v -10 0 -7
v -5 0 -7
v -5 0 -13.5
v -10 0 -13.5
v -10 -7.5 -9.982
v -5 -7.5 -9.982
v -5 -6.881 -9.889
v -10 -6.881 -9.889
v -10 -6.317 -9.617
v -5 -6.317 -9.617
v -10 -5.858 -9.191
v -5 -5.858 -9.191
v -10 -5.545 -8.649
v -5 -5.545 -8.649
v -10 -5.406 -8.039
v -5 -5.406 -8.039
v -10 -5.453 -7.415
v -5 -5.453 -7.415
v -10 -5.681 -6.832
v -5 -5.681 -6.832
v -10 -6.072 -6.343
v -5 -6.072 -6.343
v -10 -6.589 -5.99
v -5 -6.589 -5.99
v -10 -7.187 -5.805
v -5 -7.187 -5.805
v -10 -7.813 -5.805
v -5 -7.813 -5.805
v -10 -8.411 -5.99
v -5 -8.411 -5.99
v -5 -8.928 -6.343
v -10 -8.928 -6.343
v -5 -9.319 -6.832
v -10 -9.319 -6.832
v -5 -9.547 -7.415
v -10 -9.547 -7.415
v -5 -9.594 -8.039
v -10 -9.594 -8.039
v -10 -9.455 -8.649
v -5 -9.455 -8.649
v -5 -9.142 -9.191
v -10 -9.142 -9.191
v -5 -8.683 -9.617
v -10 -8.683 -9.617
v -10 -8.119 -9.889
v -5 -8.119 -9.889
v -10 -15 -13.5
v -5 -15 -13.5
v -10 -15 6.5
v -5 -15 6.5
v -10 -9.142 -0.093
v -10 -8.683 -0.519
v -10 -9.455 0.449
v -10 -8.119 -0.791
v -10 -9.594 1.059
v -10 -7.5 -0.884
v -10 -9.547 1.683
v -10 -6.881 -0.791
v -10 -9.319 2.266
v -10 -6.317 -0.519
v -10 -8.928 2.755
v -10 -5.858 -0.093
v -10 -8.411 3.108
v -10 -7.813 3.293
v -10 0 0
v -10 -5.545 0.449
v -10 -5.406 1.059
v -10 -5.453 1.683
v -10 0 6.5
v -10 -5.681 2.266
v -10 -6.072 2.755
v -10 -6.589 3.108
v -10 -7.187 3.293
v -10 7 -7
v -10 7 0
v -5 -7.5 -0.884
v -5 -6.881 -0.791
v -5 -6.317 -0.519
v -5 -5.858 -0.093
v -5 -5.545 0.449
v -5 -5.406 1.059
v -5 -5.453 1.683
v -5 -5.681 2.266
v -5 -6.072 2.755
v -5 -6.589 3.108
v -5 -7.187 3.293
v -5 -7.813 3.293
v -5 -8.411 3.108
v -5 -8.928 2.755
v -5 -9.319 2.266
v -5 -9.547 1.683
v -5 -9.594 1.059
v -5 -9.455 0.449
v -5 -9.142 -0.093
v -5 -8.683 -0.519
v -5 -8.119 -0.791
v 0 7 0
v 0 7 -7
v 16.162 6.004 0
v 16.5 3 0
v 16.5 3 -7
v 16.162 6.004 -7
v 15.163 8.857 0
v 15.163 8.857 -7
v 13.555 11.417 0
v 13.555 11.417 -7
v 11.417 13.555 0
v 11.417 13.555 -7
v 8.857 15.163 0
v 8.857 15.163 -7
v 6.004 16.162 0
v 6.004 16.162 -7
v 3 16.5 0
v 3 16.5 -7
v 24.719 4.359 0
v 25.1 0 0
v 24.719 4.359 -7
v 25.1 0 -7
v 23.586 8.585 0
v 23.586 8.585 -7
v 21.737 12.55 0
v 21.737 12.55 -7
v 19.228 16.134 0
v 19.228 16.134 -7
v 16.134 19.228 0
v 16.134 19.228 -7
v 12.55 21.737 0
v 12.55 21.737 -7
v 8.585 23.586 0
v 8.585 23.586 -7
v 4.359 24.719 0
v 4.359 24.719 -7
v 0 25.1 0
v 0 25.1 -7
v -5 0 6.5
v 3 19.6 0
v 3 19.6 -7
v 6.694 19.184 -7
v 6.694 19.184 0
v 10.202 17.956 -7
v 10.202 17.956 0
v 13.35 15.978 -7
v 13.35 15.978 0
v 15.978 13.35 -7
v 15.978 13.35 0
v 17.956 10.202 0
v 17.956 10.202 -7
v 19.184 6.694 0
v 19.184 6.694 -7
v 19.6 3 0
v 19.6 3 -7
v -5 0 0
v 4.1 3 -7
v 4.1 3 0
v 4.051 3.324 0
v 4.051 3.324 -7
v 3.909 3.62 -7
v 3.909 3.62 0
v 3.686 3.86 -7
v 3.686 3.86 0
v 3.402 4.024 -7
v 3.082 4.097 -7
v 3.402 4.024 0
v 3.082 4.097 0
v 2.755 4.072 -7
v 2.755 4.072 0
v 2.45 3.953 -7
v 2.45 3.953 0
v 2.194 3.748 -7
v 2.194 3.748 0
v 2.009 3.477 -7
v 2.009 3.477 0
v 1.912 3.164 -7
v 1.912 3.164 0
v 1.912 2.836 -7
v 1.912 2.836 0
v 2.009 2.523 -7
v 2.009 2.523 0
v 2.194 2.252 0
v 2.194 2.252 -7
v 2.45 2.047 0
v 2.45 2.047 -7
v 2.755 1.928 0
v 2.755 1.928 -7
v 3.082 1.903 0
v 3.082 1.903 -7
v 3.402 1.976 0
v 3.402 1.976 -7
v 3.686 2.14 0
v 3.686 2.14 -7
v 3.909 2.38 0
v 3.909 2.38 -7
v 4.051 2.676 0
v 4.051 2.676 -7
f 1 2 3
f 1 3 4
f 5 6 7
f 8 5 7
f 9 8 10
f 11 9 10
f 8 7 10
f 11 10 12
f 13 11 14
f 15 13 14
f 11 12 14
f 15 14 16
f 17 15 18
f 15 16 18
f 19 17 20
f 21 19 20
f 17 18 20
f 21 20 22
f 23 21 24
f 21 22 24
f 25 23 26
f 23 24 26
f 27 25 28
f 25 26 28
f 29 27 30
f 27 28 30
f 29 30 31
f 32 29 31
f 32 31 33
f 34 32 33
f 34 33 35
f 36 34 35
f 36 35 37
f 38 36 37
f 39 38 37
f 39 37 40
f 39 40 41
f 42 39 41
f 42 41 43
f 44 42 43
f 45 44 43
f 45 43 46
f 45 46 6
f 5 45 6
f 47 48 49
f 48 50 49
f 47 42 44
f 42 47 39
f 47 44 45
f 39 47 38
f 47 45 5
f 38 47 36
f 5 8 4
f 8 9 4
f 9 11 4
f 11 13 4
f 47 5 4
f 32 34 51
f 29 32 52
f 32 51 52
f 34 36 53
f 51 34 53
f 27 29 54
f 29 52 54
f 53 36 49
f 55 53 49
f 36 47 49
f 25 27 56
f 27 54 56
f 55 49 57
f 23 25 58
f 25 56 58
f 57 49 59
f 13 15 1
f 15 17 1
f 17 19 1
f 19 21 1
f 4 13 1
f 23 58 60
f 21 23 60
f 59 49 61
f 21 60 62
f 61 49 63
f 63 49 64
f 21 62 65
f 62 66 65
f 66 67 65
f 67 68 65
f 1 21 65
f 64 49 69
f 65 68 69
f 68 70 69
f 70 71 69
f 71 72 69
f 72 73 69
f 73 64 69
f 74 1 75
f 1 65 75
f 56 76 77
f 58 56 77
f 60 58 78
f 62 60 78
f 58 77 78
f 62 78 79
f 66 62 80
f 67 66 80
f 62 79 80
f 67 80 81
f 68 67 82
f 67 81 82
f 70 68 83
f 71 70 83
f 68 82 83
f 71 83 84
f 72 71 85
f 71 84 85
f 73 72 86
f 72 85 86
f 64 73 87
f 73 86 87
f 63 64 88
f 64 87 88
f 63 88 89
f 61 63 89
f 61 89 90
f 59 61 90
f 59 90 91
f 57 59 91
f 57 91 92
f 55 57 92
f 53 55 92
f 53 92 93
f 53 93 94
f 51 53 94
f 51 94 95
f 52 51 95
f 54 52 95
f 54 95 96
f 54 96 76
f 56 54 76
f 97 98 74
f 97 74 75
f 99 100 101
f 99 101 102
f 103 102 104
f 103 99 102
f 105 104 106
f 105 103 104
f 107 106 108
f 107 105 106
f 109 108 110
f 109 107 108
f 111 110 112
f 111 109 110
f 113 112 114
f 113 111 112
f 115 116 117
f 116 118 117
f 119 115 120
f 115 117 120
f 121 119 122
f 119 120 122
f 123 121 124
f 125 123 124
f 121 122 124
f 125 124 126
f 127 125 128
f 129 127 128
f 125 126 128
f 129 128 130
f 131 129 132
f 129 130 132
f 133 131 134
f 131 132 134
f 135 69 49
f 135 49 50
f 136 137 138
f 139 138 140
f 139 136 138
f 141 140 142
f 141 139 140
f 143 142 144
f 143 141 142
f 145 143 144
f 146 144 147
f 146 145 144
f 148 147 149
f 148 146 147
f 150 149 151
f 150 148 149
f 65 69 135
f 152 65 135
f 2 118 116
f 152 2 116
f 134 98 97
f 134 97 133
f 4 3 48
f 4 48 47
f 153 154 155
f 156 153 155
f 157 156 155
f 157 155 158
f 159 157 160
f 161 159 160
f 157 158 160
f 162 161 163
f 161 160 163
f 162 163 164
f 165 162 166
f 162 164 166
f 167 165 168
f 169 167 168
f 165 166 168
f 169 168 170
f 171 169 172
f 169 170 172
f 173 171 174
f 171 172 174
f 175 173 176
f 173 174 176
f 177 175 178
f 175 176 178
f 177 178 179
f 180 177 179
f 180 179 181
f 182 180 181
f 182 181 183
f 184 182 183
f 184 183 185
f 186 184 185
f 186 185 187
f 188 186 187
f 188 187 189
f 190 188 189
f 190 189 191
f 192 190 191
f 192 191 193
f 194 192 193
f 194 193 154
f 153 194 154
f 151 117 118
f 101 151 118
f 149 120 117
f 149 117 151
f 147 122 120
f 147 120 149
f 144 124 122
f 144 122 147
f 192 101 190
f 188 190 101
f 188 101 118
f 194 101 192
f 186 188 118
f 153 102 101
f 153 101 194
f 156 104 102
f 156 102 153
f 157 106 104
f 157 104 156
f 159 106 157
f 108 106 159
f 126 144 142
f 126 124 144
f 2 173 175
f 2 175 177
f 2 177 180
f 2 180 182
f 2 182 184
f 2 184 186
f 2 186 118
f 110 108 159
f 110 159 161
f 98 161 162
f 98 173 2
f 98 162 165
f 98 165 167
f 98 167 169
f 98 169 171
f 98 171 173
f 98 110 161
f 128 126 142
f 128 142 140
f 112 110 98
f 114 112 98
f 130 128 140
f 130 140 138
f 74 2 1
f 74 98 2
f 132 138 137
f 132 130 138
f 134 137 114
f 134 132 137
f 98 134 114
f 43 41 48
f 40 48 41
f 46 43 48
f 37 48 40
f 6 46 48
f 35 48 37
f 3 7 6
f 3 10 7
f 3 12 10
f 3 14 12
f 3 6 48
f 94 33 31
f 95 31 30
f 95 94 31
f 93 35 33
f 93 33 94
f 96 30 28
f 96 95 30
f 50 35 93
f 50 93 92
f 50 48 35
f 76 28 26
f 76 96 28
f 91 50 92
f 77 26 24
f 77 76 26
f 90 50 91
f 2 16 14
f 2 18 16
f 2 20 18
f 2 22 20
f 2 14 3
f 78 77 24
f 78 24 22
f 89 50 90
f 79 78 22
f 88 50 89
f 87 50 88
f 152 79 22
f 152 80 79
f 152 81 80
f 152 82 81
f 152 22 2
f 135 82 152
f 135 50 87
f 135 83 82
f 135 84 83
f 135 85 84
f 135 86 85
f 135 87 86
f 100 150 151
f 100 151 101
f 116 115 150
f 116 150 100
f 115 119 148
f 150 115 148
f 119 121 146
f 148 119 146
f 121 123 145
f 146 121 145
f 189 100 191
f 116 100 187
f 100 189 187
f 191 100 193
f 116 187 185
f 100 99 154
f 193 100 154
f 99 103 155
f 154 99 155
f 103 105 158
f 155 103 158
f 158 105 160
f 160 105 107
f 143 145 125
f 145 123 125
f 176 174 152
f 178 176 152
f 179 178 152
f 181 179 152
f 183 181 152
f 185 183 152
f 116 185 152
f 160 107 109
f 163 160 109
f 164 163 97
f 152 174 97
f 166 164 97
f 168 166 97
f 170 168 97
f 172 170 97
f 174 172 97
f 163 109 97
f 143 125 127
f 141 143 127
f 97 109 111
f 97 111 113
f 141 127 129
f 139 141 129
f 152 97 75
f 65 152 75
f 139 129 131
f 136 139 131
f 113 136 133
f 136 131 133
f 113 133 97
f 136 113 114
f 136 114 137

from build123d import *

# Parameters (mm, degrees)
SKETCH1_W           = 25.1
SKETCH1_H           = 7
REVOLVE1_ANGLE      = 90
SKETCH2_W           = 7
SKETCH2_H           = 7
BOSS_EXTRUDE1_DEPTH = 10
SKETCH6_W           = 5
SKETCH6_H           = 7
BOSS_EXTRUDE2_DEPTH = 15
SKETCH7_W           = 5
SKETCH7_H           = 15
BOSS_EXTRUDE3_DEPTH = 6.5
SKETCH8_W           = 5
SKETCH8_H           = 15
BOSS_EXTRUDE4_DEPTH = 6.5
SKETCH10_R          = 2.1
CUT_EXTRUDE8_DEPTH  = 18.5
SKETCH12_R          = 1.1
CUT_EXTRUDE11_DEPTH = 10


with BuildPart() as part:
    # Sketch1 → Revolve1 (revolve)
    with BuildSketch(Plane(origin=(0, 0, 0), x_dir=(1, 0, 0), z_dir=(0, 1, 0))):
        with Locations((12.55, 3.5)):
            Rectangle(SKETCH1_W, SKETCH1_H)
    revolve(axis=Axis((0, 0, 0), (0, 0, 1)), revolution_arc=REVOLVE1_ANGLE)

    # Sketch2 → Boss-Extrude1 (add)
    with BuildSketch(Plane.ZY):
        with Locations((-3.5, 3.5)):
            Rectangle(SKETCH2_W, SKETCH2_H)
    extrude(amount=BOSS_EXTRUDE1_DEPTH)

    # Sketch6 → Boss-Extrude2 (add)
    with BuildSketch(Plane(origin=(0, 0, 0), x_dir=(-1, 0, 0), z_dir=(0, -1, 0))):
        with Locations((7.5, 3.5)):
            Rectangle(SKETCH6_W, SKETCH6_H)
    extrude(amount=BOSS_EXTRUDE2_DEPTH)

    # Sketch7 → Boss-Extrude3 (add)
    with BuildSketch(Plane.XY):
        with Locations((-7.5, -7.5)):
            Rectangle(SKETCH7_W, SKETCH7_H)
    extrude(amount=BOSS_EXTRUDE3_DEPTH)

    # Sketch8 → Boss-Extrude4 (add)
    with BuildSketch(Plane(origin=(0, 0, -7), x_dir=(-1, 0, 0), z_dir=(0, 0, -1))):
        with Locations((7.5, -7.5)):
            Rectangle(SKETCH8_W, SKETCH8_H)
    extrude(amount=BOSS_EXTRUDE4_DEPTH)

    # Sketch10 → Cut-Extrude8 (cut)
    with BuildSketch(Plane(origin=(-5, 0, 0), x_dir=(0, 0, -1), z_dir=(1, 0, 0))):
        with Locations((-1.216, -7.5)):
            Circle(SKETCH10_R)
        with Locations((7.882, -7.5)):
            Circle(SKETCH10_R)
    extrude(amount=-CUT_EXTRUDE8_DEPTH, mode=Mode.SUBTRACT)

    # Sketch12 → Cut-Extrude11 (cut)
    with BuildSketch(Plane.XY):
        with Locations((3, 3)):
            Circle(SKETCH12_R)
        with BuildLine():
            Line((3, 16.5), (3, 19.6))
            ThreePointArc((3, 19.6), (14.737972568, 14.737972568), (19.6, 3))
            Line((19.6, 3), (16.5, 3))
            ThreePointArc((16.5, 3), (12.545941546, 12.545941546), (3, 16.5))
        make_face()
    extrude(amount=-CUT_EXTRUDE11_DEPTH, mode=Mode.SUBTRACT)


solid = part.part
